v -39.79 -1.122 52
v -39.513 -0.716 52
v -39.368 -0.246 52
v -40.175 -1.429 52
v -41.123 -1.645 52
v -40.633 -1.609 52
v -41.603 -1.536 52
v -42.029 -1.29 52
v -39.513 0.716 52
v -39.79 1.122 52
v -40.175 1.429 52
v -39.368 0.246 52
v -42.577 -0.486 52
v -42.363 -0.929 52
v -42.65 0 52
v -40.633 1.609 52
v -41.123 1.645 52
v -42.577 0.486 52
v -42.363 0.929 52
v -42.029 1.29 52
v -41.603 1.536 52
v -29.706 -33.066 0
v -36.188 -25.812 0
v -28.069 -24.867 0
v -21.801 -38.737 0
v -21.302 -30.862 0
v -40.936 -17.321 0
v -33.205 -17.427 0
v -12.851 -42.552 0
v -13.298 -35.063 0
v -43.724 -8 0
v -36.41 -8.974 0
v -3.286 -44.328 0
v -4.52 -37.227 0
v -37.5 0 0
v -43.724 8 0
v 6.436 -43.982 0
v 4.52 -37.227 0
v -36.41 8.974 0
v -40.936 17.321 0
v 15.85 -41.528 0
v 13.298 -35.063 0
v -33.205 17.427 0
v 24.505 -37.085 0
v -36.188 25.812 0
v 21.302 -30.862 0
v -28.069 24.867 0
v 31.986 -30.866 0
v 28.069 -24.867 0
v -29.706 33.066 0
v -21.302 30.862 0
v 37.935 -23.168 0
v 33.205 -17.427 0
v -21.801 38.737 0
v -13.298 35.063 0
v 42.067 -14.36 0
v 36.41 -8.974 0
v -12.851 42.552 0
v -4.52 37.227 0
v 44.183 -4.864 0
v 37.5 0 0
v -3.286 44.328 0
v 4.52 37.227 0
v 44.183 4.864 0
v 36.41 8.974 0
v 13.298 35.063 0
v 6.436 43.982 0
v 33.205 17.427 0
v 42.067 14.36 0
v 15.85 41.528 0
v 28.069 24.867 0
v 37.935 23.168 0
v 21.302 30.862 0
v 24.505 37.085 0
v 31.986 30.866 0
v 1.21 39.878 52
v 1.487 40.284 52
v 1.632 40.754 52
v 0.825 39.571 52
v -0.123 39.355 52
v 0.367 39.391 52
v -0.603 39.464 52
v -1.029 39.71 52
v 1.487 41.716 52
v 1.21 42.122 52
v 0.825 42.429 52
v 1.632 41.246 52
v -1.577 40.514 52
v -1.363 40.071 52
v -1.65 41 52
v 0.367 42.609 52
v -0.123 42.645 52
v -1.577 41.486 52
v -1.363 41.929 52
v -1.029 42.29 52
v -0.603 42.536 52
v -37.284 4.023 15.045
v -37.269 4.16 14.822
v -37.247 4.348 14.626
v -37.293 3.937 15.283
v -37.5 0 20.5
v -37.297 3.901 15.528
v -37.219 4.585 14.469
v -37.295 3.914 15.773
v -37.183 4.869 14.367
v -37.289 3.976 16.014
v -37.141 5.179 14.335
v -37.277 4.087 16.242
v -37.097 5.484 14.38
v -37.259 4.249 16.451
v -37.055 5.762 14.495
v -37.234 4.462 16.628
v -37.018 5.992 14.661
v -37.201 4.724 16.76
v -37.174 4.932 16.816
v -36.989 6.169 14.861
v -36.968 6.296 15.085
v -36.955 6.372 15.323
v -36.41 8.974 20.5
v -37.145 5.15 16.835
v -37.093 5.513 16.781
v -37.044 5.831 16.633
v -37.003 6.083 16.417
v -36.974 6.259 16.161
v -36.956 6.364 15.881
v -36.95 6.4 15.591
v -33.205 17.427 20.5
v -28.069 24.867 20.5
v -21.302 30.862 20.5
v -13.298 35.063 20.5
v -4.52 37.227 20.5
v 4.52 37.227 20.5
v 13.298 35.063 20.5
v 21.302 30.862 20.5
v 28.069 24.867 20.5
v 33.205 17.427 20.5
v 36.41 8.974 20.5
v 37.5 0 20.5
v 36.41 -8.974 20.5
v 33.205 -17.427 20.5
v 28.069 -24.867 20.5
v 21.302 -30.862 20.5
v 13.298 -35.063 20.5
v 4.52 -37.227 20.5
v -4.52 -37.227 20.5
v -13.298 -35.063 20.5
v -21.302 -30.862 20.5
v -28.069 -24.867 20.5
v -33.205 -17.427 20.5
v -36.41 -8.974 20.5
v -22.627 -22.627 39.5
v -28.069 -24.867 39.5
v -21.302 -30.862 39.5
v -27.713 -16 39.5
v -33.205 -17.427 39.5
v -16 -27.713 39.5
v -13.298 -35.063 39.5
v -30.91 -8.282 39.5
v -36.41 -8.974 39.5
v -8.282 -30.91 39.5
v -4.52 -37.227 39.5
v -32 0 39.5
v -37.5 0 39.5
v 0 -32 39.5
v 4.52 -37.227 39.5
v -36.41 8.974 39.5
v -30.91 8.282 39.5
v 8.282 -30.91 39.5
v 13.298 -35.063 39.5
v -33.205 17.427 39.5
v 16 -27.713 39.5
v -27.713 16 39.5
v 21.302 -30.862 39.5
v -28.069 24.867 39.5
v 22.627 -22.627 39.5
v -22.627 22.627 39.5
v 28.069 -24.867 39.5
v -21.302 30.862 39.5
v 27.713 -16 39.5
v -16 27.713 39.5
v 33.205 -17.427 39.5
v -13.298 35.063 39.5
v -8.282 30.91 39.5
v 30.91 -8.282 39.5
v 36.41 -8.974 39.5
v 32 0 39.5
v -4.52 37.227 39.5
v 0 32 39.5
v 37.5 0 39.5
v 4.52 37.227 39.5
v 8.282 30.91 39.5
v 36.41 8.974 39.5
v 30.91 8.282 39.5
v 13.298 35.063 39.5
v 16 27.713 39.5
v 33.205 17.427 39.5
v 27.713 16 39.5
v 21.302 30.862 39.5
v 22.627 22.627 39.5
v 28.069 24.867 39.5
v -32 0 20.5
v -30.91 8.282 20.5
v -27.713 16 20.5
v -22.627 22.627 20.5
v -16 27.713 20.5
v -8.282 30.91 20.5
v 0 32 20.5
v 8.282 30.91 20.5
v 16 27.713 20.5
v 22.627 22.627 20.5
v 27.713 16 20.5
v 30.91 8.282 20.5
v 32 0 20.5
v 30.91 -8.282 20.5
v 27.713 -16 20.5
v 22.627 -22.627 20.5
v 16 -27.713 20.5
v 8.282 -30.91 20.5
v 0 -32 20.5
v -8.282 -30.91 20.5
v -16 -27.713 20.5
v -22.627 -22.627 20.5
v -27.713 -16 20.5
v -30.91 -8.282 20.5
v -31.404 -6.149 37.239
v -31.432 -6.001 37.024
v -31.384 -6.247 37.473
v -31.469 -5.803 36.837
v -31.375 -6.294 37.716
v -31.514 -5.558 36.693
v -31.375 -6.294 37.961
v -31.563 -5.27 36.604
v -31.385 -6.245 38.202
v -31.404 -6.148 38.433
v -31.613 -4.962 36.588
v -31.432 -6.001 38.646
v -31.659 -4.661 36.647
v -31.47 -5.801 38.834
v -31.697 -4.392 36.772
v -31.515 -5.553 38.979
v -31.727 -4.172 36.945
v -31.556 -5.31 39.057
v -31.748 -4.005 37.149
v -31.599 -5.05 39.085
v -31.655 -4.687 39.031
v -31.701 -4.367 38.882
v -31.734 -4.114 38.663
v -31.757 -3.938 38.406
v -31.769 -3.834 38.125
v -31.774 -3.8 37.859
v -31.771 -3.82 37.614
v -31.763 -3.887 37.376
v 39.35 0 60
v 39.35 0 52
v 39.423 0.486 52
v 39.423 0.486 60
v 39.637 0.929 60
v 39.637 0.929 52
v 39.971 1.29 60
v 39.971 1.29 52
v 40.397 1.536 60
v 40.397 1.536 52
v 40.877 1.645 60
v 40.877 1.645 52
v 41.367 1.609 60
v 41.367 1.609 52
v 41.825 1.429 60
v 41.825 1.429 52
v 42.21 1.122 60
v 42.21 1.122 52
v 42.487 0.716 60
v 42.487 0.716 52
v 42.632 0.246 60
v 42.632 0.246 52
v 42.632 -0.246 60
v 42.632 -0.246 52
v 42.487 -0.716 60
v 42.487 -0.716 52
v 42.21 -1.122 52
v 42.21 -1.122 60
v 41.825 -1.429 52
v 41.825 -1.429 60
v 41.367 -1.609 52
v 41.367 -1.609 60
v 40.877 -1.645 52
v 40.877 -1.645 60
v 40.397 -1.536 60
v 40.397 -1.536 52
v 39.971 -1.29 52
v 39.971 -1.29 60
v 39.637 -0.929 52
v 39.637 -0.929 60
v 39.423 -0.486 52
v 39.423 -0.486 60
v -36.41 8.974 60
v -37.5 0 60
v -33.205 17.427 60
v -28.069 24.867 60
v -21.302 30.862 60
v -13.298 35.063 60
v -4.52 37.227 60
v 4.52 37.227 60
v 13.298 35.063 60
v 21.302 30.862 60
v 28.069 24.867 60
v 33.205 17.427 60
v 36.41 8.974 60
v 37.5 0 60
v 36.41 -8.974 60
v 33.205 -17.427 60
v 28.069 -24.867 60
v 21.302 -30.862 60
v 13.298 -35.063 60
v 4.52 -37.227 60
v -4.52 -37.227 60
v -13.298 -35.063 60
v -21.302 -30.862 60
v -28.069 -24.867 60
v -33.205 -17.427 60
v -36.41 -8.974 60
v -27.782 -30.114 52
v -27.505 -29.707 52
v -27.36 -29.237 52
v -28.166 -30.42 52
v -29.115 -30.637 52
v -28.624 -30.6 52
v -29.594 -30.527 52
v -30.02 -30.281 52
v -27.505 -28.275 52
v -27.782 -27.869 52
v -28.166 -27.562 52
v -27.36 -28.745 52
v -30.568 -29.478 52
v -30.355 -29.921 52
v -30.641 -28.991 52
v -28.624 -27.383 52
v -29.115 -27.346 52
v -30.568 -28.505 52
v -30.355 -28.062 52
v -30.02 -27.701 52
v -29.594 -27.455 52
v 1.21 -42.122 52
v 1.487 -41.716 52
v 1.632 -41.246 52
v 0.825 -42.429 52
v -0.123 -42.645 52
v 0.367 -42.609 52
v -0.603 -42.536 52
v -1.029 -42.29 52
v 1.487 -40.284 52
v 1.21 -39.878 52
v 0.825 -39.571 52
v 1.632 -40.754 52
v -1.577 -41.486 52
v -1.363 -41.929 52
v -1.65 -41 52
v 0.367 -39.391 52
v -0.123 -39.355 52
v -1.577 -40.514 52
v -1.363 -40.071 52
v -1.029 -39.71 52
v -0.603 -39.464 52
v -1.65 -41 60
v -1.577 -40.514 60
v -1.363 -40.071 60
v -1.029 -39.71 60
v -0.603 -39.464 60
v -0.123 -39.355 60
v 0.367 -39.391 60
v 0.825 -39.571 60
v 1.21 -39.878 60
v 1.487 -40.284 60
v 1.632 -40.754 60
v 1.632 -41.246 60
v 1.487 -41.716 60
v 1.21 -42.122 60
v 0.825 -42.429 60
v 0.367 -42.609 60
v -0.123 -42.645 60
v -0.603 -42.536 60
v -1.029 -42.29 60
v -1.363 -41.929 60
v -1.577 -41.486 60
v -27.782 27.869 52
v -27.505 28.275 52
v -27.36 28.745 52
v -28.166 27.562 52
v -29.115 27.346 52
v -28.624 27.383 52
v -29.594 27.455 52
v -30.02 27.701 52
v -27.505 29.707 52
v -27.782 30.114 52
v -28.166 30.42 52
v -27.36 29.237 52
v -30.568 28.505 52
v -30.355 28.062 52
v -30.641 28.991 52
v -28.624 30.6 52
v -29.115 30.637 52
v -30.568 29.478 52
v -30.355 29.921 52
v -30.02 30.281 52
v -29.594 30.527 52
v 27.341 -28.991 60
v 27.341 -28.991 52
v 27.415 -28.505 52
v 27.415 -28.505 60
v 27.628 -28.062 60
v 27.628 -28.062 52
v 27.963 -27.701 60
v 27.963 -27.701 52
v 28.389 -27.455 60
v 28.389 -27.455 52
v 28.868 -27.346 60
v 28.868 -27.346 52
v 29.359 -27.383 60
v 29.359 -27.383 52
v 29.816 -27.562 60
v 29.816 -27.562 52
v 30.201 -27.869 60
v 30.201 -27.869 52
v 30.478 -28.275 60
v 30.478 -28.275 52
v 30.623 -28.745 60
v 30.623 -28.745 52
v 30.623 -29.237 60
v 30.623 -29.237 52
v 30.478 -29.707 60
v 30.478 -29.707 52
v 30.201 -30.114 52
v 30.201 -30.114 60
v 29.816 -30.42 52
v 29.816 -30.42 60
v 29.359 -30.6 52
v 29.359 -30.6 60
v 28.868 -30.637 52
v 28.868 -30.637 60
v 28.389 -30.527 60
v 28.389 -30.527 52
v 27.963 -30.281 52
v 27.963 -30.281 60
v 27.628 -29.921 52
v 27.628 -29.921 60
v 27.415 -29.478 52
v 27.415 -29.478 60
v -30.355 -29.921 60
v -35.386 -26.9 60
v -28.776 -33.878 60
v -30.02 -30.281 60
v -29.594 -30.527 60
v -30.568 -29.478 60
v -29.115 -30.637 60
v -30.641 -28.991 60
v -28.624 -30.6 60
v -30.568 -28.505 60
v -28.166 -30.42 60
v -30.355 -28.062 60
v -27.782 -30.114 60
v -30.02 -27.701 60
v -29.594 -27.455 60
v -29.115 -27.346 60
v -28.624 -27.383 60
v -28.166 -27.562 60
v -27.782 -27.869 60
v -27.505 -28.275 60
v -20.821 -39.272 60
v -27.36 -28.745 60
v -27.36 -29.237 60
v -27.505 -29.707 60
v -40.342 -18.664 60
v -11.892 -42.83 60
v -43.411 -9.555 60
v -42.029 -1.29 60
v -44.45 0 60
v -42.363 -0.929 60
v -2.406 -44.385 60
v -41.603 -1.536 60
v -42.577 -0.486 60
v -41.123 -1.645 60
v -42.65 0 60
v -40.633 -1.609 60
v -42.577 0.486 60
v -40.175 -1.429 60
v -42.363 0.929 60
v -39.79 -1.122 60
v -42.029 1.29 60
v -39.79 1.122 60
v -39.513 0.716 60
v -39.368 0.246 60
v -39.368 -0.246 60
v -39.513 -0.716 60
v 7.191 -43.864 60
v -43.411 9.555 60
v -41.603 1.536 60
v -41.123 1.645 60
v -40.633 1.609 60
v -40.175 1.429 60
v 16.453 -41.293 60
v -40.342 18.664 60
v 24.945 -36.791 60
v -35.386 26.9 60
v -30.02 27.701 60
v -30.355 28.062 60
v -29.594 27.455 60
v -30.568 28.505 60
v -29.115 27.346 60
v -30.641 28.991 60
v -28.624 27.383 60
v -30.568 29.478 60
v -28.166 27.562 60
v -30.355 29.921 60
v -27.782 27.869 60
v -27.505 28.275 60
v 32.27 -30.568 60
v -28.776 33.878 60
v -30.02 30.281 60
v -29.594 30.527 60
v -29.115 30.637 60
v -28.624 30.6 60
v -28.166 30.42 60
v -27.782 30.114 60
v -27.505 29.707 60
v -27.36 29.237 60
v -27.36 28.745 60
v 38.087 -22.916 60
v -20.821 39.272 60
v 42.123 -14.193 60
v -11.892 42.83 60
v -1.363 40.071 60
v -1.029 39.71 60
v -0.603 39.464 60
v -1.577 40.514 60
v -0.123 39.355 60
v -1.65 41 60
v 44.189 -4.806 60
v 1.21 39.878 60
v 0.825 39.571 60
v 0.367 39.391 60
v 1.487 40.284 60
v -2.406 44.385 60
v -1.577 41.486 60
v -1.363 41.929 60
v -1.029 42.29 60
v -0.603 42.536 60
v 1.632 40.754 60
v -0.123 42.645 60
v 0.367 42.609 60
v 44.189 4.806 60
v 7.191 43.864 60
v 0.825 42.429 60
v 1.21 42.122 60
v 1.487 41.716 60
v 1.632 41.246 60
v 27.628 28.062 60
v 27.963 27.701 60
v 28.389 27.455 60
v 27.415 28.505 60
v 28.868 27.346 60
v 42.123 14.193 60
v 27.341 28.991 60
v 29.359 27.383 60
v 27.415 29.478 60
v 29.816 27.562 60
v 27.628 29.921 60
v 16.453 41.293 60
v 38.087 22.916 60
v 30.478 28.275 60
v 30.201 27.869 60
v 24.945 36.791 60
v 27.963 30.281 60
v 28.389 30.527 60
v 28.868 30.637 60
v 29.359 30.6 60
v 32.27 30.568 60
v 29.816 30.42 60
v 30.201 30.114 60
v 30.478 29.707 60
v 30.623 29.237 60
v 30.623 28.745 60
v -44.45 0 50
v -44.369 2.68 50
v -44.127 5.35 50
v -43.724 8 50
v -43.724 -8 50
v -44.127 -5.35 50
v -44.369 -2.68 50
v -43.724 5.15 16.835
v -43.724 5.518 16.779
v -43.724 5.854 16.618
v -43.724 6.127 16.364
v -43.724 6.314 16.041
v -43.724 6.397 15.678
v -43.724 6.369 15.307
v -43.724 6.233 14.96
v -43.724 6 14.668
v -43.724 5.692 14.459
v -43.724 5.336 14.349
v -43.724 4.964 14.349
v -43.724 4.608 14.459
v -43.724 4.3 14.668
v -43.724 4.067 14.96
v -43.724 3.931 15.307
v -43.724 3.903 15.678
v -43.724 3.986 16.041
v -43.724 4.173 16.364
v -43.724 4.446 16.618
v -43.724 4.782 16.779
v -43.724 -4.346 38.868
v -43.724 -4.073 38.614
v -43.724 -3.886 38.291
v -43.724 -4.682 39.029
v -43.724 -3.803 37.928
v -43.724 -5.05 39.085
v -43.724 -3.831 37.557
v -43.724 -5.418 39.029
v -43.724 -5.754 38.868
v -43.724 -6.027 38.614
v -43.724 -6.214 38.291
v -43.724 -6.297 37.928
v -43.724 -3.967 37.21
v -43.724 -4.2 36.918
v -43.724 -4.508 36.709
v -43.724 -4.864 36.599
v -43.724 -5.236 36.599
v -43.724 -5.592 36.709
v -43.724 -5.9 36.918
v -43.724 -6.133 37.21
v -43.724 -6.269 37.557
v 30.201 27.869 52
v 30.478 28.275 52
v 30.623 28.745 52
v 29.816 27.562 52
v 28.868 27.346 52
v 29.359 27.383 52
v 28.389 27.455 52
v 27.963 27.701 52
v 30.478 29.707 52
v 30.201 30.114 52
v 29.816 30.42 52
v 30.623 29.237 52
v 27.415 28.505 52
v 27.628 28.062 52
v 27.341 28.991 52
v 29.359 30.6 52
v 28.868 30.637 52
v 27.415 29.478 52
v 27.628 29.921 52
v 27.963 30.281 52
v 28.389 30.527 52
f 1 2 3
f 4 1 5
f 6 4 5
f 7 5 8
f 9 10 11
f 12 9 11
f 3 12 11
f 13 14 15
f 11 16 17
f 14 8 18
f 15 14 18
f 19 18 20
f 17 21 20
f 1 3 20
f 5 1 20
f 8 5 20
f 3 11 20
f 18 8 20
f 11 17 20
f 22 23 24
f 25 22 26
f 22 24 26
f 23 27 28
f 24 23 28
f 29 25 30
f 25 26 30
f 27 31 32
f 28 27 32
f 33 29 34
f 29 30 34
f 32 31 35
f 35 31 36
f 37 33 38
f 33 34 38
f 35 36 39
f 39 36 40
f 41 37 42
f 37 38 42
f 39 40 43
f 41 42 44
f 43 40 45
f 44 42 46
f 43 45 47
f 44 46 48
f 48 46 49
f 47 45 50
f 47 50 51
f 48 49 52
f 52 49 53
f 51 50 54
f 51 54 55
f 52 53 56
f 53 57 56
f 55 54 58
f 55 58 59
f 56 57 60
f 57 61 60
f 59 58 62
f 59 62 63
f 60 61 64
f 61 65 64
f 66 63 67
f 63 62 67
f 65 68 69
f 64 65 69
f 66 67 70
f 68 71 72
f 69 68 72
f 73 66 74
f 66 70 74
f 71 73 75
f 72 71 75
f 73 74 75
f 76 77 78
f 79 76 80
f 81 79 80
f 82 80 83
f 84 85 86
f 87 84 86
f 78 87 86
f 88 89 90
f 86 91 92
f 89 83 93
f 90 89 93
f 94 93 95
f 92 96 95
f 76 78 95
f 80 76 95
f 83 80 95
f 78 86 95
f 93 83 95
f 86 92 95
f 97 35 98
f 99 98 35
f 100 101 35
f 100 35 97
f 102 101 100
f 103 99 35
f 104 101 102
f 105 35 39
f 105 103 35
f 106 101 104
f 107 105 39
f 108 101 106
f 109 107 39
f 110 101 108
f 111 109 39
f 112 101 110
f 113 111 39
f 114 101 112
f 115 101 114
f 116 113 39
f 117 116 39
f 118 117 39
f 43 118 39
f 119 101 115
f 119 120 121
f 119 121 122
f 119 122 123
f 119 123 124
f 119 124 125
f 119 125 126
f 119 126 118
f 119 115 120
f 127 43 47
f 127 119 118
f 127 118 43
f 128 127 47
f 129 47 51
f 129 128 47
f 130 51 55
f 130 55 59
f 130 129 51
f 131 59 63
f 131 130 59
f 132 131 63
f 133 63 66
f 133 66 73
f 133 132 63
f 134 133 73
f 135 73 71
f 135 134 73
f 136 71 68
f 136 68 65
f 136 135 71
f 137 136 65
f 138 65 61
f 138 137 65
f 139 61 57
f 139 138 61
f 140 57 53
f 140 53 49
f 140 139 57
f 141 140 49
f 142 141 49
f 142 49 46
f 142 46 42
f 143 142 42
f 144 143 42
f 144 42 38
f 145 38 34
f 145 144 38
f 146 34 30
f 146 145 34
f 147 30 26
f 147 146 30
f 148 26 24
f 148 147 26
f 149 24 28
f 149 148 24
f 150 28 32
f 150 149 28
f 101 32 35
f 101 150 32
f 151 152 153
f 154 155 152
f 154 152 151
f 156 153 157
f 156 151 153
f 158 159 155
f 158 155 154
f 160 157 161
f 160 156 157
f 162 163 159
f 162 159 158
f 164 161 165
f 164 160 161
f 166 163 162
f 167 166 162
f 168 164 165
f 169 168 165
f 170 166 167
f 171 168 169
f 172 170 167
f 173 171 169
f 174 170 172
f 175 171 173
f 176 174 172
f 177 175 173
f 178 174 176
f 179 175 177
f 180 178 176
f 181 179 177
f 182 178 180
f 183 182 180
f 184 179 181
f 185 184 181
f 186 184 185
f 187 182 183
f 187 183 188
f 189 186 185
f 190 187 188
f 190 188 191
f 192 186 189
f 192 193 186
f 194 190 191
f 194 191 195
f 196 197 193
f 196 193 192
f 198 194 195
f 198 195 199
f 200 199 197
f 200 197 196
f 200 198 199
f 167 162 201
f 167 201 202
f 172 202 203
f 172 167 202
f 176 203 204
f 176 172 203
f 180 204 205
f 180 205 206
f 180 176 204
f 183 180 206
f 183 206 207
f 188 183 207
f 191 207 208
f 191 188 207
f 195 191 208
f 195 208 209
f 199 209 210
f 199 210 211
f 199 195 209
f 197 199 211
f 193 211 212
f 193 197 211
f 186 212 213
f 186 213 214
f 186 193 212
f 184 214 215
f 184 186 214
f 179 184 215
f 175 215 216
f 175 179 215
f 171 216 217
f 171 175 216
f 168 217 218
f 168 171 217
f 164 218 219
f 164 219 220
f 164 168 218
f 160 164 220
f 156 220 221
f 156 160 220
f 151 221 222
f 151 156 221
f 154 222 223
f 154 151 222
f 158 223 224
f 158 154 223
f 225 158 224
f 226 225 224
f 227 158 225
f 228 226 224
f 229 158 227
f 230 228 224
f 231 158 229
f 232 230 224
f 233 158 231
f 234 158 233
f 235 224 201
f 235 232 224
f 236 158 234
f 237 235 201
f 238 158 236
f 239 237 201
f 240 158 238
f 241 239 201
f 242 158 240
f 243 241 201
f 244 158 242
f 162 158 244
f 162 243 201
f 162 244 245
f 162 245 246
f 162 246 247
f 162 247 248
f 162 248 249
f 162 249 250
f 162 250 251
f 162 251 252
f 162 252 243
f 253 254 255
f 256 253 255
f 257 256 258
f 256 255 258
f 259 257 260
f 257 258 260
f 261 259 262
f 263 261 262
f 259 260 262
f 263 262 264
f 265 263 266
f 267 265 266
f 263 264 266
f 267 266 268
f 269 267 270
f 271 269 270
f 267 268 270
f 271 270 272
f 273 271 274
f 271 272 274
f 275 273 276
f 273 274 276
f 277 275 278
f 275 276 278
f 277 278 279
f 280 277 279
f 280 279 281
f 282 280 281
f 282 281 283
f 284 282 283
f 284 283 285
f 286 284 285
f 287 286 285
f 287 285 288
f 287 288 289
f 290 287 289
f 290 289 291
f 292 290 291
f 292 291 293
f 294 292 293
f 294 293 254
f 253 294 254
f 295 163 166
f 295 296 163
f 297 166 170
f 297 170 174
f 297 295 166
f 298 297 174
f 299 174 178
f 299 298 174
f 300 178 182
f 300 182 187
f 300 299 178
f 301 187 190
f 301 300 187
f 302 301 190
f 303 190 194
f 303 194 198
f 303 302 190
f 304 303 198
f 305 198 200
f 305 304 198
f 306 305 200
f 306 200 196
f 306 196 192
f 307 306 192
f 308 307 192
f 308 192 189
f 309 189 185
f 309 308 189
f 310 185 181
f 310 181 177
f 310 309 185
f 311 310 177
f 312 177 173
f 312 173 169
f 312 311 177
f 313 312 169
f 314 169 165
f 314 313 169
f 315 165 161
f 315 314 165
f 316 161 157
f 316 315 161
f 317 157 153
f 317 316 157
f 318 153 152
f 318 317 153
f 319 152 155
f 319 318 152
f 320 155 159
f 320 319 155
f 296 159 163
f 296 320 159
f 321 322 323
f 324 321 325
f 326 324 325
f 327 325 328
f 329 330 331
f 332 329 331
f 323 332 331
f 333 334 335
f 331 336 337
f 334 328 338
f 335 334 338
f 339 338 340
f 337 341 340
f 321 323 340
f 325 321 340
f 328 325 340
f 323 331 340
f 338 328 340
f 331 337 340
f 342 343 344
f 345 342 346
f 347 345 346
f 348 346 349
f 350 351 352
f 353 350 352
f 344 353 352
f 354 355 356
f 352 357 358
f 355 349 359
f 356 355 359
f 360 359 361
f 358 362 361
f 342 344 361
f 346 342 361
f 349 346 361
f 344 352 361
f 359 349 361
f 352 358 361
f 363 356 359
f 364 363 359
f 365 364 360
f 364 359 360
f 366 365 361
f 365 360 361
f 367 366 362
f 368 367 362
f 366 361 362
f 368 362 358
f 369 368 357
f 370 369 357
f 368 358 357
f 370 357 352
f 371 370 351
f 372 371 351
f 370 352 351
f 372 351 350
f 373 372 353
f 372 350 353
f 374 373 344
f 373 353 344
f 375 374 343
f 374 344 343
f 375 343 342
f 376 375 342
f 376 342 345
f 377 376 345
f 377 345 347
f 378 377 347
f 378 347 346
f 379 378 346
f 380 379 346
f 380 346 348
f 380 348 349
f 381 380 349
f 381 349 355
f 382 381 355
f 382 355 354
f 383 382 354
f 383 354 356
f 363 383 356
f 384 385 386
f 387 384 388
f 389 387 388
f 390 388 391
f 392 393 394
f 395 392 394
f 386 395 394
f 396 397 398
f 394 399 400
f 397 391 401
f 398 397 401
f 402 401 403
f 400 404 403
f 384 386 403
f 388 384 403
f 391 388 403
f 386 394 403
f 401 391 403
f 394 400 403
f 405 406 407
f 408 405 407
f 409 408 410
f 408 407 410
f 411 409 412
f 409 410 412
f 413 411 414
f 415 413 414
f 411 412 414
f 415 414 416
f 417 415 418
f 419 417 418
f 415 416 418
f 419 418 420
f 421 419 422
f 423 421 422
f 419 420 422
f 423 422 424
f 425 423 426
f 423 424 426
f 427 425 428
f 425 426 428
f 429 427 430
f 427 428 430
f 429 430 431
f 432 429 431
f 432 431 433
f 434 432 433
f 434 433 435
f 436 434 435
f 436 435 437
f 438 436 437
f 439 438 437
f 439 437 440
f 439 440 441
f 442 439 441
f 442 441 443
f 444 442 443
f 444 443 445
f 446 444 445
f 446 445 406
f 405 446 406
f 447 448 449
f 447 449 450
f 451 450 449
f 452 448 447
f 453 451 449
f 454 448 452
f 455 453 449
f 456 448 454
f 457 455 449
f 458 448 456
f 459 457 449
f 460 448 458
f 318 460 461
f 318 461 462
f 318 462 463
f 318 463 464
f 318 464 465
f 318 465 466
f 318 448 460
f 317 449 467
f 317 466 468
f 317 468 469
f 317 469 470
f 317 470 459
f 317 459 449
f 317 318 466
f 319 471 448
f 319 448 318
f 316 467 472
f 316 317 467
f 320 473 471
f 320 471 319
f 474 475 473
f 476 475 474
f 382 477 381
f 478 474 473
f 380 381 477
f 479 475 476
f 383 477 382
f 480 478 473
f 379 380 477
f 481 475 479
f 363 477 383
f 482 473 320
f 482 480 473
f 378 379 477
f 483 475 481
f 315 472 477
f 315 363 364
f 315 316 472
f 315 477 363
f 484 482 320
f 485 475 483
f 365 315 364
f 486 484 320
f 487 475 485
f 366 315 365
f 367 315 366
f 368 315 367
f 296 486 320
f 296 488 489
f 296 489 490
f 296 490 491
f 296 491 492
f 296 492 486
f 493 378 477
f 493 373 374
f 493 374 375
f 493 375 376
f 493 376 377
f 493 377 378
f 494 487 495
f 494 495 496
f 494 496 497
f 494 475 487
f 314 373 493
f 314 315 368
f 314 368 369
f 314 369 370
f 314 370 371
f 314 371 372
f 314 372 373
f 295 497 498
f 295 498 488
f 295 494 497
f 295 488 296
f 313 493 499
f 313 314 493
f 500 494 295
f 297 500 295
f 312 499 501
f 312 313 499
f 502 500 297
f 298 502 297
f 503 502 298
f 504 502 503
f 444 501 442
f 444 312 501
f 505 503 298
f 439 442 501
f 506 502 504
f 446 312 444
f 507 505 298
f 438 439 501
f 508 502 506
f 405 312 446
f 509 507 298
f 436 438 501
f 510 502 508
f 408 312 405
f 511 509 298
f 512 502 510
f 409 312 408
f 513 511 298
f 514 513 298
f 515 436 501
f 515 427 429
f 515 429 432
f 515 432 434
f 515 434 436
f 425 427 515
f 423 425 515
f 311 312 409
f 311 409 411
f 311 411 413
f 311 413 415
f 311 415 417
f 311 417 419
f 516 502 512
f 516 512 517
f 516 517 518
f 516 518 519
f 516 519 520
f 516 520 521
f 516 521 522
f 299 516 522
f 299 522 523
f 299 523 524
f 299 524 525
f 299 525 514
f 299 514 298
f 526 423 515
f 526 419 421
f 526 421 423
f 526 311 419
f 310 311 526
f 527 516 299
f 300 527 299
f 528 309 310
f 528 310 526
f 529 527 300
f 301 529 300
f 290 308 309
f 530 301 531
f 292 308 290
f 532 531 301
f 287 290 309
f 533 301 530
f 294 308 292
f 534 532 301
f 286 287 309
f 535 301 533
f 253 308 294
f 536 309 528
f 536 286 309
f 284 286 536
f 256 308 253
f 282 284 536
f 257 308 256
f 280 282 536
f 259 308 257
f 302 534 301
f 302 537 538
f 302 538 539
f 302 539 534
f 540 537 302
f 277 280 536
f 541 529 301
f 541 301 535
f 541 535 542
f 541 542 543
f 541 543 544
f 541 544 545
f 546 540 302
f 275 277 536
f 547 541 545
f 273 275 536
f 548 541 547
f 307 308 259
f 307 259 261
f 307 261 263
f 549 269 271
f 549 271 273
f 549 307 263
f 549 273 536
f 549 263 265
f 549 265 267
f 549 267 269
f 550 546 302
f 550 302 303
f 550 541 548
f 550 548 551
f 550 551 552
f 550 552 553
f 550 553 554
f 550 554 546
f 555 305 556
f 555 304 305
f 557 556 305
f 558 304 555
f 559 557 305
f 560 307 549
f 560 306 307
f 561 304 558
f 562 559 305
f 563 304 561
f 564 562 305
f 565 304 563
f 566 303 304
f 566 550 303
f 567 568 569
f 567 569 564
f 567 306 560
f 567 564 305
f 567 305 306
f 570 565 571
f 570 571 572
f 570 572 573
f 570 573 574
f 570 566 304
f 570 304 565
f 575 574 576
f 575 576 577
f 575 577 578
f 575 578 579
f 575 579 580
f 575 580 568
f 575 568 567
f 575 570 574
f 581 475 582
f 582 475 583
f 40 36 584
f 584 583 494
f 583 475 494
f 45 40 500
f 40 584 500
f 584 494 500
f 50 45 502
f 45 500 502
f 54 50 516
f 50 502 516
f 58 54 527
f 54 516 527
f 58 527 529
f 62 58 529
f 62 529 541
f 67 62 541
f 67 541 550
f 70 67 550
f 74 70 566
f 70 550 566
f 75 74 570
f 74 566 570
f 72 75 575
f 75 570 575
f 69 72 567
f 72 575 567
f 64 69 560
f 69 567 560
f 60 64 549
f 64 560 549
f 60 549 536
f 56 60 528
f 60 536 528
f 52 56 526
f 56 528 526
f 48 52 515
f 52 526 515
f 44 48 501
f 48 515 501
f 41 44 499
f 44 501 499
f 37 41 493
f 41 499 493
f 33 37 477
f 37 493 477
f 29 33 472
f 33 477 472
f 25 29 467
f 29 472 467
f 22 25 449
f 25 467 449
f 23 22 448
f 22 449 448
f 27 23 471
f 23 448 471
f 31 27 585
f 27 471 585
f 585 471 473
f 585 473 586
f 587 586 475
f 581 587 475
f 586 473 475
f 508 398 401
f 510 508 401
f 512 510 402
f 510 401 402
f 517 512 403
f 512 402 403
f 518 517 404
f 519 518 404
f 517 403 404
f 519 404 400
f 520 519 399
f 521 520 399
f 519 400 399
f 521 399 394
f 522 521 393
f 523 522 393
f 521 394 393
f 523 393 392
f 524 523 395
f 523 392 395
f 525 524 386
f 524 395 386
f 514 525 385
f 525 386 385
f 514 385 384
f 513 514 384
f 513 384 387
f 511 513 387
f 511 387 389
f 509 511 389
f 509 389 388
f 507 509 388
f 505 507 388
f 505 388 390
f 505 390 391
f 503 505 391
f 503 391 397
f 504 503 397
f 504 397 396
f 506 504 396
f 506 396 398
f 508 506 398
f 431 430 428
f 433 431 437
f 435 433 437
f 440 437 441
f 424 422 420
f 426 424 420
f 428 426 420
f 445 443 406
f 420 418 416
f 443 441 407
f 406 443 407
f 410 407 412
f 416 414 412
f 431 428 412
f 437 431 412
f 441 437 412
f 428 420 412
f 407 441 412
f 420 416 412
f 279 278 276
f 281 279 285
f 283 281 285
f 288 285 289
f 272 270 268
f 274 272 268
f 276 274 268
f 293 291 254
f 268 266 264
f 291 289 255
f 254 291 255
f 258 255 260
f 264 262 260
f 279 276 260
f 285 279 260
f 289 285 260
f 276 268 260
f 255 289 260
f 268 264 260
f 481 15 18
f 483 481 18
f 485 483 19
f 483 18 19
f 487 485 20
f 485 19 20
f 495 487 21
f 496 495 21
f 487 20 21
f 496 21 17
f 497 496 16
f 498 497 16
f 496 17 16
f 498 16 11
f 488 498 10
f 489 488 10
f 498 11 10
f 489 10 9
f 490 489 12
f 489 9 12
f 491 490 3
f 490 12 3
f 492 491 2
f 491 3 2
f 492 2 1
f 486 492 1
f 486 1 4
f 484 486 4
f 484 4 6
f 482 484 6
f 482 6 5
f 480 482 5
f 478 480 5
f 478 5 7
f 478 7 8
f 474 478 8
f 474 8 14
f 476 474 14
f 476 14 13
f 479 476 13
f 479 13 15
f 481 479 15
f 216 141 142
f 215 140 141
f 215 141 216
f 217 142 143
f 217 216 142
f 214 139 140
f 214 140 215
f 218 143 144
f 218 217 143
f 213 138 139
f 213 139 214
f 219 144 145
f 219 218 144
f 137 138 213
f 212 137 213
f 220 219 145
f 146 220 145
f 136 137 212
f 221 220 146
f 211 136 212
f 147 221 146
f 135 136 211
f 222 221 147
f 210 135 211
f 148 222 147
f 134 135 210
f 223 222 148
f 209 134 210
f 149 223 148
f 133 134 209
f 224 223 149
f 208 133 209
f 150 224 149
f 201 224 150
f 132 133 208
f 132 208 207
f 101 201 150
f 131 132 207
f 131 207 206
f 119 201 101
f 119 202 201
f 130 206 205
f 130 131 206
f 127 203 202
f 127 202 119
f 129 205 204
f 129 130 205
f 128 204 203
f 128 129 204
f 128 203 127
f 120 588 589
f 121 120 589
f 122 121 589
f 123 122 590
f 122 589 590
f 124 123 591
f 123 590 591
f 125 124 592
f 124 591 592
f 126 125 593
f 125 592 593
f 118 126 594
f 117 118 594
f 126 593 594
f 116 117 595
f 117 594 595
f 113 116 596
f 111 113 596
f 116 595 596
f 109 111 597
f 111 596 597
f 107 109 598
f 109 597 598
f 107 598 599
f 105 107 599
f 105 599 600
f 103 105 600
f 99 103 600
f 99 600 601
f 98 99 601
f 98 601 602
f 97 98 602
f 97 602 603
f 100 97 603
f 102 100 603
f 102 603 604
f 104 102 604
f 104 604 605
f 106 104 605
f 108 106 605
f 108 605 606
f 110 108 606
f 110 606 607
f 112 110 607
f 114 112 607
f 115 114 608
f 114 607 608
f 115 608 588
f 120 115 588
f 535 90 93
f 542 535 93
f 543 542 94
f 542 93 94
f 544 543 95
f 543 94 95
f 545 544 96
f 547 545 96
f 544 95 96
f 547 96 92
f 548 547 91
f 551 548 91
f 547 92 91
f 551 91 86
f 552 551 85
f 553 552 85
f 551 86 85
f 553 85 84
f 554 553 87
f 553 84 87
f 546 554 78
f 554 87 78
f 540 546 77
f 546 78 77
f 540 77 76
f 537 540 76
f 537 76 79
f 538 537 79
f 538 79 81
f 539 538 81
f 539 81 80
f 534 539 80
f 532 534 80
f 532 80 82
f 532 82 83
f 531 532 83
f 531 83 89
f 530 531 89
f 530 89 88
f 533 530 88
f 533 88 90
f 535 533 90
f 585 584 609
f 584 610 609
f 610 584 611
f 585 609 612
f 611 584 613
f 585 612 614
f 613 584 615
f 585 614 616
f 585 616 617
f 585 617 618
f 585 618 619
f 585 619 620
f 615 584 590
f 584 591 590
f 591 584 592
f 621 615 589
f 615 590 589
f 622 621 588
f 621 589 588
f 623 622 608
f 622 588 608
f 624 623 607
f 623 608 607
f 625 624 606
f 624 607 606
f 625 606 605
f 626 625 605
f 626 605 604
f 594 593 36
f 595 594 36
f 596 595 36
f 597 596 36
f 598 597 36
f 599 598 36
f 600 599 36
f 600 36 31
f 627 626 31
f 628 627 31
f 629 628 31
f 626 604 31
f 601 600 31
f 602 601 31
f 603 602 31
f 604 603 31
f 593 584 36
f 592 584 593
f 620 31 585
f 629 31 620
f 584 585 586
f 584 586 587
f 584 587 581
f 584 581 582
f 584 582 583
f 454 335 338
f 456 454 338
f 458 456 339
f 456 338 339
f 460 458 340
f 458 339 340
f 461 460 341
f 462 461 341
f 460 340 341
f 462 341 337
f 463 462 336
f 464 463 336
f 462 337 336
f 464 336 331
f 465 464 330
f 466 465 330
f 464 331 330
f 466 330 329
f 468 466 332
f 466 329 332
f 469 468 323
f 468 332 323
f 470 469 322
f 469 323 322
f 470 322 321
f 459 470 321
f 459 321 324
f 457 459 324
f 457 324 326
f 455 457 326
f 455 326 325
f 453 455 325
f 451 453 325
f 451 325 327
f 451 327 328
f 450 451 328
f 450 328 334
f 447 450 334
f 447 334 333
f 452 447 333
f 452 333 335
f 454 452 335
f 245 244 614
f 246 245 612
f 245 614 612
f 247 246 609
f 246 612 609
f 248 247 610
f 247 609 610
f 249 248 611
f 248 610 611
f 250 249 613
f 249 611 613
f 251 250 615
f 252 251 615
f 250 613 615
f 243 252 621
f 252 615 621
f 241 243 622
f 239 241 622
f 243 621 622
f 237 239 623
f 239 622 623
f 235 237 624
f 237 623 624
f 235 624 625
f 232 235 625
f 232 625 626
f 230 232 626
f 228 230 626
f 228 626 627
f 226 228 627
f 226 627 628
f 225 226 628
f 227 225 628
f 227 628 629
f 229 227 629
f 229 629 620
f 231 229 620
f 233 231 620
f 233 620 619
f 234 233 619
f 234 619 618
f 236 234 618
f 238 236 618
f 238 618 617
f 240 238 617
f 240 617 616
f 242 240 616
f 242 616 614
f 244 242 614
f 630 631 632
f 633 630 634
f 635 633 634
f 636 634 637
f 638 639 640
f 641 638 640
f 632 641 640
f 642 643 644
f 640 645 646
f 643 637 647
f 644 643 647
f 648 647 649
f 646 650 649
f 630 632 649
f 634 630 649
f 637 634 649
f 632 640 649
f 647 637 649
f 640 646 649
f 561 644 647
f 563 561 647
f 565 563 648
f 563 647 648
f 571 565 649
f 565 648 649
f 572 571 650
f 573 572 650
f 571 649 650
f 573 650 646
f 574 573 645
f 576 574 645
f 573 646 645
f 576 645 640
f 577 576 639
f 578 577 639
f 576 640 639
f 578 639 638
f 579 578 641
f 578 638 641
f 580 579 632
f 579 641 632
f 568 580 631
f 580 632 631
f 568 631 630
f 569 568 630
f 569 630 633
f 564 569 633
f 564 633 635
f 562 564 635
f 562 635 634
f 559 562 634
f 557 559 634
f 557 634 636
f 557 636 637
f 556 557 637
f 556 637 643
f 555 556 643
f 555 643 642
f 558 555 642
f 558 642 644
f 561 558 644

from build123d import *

# Parameters (mm, degrees)
SKETCH1_W                  = 44.45
SKETCH1_H                  = 60
CUT_EXTRUDE1_DEPTH         = 50
F_4_CLEARANCE_HOLE1_D      = 3.3
F_4_CLEARANCE_HOLE1_DEPTH  = 8
F_2_CLEARANCE_HOLE1_REACH  = 117.544
F_2_CLEARANCE_HOLE1_BORE_R = 1.25
F_2_CLEARANCE_HOLE2_REACH  = 117.544
F_2_CLEARANCE_HOLE2_BORE_R = 1.25


with BuildPart() as part:
    # Sketch1 → Revolve1 (revolve)
    with BuildSketch(Plane.XZ, mode=Mode.PRIVATE) as revolve1_sk:
        with Locations((22.225, 30)):
            Rectangle(SKETCH1_W, SKETCH1_H)
    revolve(revolve1_sk.sketch.rotate(Axis((0, 0, 60), (0, 0, -1)), 180), axis=Axis((0, 0, 60), (0, 0, -1)))

    # Sketch2 → Cut-Extrude1 (cut)
    with BuildSketch(Plane(origin=(0, 0, 0), x_dir=(-1, 0, 0), z_dir=(0, 0, -1))):
        with BuildLine():
            Line((43.7241638, 8), (43.7241638, -8))
            ThreePointArc((43.7241638, -8), (44.45, 0), (43.7241638, 8))
        make_face()
    extrude(amount=-CUT_EXTRUDE1_DEPTH, mode=Mode.SUBTRACT)

    # Sketch3 → Cut-Revolve1 (revolve, cut)
    with BuildSketch(Plane.XZ, mode=Mode.PRIVATE) as cut_revolve1_sk:
        Polygon((37.5, 60), (0, 60), (0, 0), (37.5, 0), (37.5, 20.5), (32, 20.5), (32, 39.5), (37.5, 39.5), align=None)
    revolve(cut_revolve1_sk.sketch.rotate(Axis((0, 0, 60), (0, 0, -1)), 180), axis=Axis((0, 0, 60), (0, 0, -1)), mode=Mode.SUBTRACT)

    # #4 Clearance Hole1
    with Locations(Plane.XY.offset(60)):
        with Locations((28.991378029, 28.991378029), (0, 41), (-28.991378029, 28.991378029), (-41, 0), (-28.991378029, -28.991378029), (0, -41), (28.991378029, -28.991378029), (41, 0)):
            Hole(F_4_CLEARANCE_HOLE1_D / 2, depth=F_4_CLEARANCE_HOLE1_DEPTH)

    # #2 Clearance Hole1 bore → #2 Clearance Hole1 (cut, up to next)
    with BuildSketch(Plane.ZY.offset(43.7241638), mode=Mode.PRIVATE) as f_2_clearance_hole1_sk1:
        with Locations((15.584748033, 5.15)):
            Circle(F_2_CLEARANCE_HOLE1_BORE_R)
    f_2_clearance_hole1_tool1 = extrude(f_2_clearance_hole1_sk1.sketch, amount=-F_2_CLEARANCE_HOLE1_REACH, mode=Mode.PRIVATE) & part.part
    add(f_2_clearance_hole1_tool1.solids().sort_by_distance((-43.724164, 5.15, 15.584748))[0], mode=Mode.SUBTRACT)

    # #2 Clearance Hole2 bore → #2 Clearance Hole2 (cut, up to next)
    with BuildSketch(Plane.ZY.offset(43.7241638), mode=Mode.PRIVATE) as f_2_clearance_hole2_sk1:
        with Locations((37.834748033, -5.05)):
            Circle(F_2_CLEARANCE_HOLE2_BORE_R)
    f_2_clearance_hole2_tool1 = extrude(f_2_clearance_hole2_sk1.sketch, amount=-F_2_CLEARANCE_HOLE2_REACH, mode=Mode.PRIVATE) & part.part
    add(f_2_clearance_hole2_tool1.solids().sort_by_distance((-43.724164, -5.05, 37.834748))[0], mode=Mode.SUBTRACT)


solid = part.part
